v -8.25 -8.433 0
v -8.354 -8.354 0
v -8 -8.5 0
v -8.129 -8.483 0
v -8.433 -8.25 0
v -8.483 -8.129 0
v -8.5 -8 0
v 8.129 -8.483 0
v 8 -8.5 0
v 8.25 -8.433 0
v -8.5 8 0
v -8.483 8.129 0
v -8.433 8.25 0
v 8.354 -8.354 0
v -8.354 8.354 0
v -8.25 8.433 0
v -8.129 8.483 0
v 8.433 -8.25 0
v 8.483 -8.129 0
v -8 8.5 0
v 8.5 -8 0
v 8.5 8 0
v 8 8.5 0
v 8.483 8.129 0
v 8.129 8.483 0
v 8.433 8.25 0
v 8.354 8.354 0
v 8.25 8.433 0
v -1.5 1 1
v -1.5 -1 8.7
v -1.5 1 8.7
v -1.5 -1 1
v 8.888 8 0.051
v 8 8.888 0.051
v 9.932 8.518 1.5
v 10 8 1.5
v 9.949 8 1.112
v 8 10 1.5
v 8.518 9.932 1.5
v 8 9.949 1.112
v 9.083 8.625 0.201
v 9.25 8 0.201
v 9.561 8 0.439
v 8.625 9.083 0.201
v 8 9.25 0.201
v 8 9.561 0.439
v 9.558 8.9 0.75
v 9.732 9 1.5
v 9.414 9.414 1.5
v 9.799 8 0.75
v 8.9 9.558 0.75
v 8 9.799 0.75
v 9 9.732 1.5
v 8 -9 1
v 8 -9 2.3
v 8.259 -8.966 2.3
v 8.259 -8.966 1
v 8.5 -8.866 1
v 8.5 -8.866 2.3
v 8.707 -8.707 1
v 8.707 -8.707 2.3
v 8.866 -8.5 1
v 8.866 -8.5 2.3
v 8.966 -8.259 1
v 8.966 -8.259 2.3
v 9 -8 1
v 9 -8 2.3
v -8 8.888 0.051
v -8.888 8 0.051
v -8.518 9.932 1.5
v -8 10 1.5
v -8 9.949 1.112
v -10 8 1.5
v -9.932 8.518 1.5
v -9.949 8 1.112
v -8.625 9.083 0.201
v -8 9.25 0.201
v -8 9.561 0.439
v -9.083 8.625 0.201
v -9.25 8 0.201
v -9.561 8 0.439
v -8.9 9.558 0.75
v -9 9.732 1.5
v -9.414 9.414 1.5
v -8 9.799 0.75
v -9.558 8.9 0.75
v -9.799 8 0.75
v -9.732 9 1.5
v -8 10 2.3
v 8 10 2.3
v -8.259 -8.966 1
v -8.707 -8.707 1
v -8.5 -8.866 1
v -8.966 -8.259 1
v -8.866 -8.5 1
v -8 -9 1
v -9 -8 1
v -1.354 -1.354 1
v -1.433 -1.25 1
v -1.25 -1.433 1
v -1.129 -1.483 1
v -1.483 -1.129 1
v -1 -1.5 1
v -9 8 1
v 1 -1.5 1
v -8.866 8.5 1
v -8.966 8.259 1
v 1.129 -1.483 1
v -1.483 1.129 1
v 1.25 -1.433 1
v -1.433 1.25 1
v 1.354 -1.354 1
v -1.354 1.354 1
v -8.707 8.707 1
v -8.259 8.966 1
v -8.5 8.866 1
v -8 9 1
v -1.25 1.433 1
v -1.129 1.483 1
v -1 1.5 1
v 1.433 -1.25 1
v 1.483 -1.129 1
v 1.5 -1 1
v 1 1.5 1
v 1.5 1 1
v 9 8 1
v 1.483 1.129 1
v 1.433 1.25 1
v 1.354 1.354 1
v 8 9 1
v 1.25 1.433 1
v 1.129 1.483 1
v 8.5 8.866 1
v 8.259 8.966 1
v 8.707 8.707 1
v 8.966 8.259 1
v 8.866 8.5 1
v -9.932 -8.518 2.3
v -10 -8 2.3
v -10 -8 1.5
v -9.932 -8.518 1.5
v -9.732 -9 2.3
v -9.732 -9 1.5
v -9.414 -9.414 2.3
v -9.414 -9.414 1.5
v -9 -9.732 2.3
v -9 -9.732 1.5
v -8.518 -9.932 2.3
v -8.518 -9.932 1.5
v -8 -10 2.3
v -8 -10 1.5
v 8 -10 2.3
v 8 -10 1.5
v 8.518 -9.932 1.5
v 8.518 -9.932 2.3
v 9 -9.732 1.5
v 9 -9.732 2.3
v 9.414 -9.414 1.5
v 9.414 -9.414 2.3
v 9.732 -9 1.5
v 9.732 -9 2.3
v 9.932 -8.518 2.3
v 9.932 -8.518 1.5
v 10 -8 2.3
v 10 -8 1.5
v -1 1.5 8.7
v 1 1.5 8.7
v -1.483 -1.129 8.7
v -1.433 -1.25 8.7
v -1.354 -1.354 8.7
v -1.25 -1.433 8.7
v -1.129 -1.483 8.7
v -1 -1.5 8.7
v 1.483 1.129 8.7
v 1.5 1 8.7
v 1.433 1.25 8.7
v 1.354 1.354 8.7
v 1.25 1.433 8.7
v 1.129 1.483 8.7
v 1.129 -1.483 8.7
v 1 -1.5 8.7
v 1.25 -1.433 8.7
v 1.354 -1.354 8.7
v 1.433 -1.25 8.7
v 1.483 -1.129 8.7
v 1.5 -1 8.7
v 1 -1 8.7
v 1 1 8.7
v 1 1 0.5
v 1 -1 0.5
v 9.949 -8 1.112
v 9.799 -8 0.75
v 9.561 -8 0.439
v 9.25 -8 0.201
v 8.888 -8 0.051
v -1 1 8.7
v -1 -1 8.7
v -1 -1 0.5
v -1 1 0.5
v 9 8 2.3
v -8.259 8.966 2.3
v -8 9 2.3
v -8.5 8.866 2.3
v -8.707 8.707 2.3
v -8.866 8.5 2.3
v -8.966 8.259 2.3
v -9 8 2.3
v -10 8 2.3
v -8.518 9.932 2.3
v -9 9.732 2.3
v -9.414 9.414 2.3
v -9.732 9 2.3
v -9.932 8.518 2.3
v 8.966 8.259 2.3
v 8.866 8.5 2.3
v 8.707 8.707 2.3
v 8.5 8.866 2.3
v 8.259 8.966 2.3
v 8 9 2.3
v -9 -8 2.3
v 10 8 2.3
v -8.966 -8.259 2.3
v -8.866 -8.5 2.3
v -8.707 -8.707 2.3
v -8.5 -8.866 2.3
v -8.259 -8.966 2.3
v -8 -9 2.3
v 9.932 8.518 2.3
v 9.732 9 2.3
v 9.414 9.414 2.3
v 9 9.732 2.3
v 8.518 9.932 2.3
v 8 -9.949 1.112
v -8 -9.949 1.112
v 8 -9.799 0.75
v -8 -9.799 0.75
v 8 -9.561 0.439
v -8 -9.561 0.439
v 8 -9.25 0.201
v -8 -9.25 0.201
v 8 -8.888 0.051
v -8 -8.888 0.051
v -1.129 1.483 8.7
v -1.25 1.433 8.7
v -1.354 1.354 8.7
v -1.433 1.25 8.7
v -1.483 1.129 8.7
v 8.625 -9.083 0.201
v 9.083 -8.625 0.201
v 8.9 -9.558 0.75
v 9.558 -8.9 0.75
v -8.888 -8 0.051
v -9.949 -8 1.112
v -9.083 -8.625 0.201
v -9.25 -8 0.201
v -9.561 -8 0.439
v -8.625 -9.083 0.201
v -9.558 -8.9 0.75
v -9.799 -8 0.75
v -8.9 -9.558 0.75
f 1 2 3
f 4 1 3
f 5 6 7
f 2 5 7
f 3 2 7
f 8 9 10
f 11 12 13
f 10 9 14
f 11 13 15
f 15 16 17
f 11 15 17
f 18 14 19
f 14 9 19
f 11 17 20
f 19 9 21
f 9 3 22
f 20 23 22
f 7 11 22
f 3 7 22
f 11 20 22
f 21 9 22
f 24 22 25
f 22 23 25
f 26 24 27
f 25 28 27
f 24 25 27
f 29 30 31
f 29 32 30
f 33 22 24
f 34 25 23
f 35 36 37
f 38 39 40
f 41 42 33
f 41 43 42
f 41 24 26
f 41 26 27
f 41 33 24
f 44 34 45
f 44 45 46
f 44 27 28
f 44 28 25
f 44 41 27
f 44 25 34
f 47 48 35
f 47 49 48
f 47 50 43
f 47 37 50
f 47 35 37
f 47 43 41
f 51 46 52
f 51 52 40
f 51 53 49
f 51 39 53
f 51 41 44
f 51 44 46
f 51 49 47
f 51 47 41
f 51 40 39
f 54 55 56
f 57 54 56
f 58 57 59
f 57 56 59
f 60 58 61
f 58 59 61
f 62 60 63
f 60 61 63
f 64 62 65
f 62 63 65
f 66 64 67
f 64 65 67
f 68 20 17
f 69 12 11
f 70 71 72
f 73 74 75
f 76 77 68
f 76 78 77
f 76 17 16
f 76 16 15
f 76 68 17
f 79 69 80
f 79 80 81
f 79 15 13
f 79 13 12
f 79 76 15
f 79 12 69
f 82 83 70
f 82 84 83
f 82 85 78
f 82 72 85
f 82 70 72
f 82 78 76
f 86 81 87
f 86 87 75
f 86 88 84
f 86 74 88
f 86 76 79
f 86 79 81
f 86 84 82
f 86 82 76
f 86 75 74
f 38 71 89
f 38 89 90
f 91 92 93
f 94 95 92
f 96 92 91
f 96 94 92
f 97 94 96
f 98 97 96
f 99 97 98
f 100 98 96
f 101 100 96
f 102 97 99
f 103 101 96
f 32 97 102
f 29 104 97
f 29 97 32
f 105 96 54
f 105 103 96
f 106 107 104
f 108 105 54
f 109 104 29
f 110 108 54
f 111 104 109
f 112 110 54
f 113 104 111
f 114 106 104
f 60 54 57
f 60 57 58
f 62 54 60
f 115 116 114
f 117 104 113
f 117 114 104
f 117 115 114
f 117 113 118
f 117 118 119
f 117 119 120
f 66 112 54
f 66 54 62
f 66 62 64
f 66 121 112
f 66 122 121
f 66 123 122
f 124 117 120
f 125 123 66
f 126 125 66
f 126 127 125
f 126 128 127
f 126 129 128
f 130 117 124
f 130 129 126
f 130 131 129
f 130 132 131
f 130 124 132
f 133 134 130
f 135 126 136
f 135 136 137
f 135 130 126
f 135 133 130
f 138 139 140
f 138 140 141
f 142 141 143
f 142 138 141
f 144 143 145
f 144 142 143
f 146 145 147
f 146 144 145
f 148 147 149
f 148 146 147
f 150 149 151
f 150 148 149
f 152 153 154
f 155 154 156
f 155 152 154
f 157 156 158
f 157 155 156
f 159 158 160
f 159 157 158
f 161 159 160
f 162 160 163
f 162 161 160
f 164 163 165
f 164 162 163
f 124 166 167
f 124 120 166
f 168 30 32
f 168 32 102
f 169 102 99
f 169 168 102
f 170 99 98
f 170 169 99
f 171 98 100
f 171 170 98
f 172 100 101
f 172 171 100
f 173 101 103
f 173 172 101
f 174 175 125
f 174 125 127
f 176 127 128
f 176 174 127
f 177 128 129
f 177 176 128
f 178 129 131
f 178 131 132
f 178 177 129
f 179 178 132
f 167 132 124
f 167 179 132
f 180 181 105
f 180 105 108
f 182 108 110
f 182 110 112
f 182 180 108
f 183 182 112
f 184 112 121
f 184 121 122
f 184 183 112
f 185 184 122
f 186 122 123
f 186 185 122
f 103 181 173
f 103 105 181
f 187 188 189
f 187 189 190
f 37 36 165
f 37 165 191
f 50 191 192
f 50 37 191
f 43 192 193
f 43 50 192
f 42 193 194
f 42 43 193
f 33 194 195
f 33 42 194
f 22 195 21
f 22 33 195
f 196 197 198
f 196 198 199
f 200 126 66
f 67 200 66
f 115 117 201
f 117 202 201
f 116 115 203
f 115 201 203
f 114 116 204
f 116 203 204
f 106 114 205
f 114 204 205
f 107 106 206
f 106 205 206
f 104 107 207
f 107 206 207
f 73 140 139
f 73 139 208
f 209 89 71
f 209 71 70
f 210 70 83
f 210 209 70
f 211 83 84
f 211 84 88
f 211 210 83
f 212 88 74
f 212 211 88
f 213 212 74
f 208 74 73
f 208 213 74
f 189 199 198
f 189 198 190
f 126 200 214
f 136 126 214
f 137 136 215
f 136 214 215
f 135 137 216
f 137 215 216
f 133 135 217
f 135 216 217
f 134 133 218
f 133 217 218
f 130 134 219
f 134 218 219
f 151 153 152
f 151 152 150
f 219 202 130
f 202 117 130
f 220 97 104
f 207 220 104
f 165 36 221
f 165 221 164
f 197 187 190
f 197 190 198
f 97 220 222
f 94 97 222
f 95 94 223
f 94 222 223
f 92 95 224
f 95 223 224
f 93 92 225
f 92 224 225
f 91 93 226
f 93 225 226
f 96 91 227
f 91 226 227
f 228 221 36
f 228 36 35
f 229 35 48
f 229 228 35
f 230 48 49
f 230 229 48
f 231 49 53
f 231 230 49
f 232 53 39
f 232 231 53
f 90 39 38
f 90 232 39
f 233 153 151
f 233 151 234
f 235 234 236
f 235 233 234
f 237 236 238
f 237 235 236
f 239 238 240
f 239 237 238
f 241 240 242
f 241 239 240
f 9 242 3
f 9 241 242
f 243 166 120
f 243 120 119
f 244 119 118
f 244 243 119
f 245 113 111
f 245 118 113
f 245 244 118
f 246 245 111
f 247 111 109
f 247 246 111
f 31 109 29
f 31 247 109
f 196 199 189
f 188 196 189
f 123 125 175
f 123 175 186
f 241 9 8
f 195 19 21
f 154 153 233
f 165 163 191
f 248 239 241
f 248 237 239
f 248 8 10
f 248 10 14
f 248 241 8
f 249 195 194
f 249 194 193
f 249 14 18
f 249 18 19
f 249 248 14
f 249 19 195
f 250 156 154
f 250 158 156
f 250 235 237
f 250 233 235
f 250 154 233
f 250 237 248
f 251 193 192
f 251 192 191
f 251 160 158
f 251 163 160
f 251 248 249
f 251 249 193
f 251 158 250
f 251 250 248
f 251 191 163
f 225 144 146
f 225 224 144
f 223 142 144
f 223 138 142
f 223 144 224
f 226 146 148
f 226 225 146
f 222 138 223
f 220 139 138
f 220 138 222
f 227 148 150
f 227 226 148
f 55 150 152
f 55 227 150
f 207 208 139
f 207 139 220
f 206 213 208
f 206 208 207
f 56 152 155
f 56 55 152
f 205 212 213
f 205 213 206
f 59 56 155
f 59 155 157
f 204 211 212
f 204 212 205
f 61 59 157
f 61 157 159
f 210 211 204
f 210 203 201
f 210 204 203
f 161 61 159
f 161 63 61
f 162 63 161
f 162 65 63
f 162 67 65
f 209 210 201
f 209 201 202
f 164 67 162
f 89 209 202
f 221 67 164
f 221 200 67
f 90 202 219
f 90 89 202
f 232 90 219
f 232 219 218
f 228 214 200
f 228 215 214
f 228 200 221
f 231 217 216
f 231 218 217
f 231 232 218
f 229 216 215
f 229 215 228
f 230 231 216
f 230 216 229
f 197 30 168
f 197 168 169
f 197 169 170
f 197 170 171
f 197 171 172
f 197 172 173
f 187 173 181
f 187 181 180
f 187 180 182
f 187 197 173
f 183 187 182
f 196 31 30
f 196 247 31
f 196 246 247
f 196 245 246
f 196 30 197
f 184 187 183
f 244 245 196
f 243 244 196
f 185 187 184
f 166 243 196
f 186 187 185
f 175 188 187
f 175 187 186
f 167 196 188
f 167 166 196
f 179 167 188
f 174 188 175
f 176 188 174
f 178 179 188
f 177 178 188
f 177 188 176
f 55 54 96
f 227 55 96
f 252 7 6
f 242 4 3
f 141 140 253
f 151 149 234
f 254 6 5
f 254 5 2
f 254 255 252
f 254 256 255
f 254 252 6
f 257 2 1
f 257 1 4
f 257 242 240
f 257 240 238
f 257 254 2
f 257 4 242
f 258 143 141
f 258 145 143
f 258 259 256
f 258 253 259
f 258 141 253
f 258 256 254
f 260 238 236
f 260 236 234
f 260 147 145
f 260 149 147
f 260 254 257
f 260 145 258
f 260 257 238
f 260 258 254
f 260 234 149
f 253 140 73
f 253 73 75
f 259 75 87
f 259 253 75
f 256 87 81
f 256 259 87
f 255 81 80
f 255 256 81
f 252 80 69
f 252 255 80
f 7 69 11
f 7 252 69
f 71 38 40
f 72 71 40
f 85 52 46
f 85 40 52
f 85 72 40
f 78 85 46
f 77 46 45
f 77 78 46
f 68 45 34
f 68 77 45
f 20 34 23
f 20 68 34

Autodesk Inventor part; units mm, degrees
ref_plane "YZ Plane" through (0, 0, 0) normal (1, 0, 0) x (0, 1, 0)
ref_plane "XZ Plane" through (0, 0, 0) normal (0, 1, 0) x (-1, 0, 0)
ref_plane "XY Plane" through (0, 0, 0) normal (0, 0, 1) x (1, 0, 0)
sketch "Skizze1" plane through (0, 0, 0) normal (0, 0, 1) x (1, 0, 0)
  line L0 (-10, 10) -> (10, 10)
  line L1 (10, 10) -> (10, -10)
  line L2 (10, -10) -> (-10, -10)
  line L3 (-10, -10) -> (-10, 10)
  line L4 (-10, 10) -> (10, -10) construction
  line L5 (10, 10) -> (-10, -10) construction
  point P0 (0, 0)
  dimension "d0" = 20
  dimension "d1" = 20
extrude "Extrusion1" add sketch "Skizze1" along normal blind 2.3
fillet "Rundung1" radius 2 4 edges at (10, 10, 1.15) (-10, 10, 1.15) (10, -10, 1.15) (-10, -10, 1.15)
shell "Wandung1" thickness 1 removed faces 1 at (-2.6667, -2, 2.3)
fillet "Rundung2" radius 1.5 8 edges at (-9.4142, 9.4142, 0) (-10, 0, 0) (-9.4142, -9.4142, 0) (0, -10, 0) (9.4142, -9.4142, 0) (10, 0, 0) (9.4142, 9.4142, 0) (0, 10, 0)
sketch "Skizze2" plane through (-9, 9, 1) normal (0, 0, 1) x (1, 0, 0)
  line L0 (7.5, -7.5) -> (10.5, -7.5)
  line L1 (10.5, -7.5) -> (10.5, -10.5)
  line L2 (10.5, -10.5) -> (7.5, -10.5)
  line L3 (7.5, -10.5) -> (7.5, -7.5)
  line L4 (7.5, -7.5) -> (10.5, -10.5) construction
  line L5 (10.5, -7.5) -> (7.5, -10.5) construction
  point P0 (9, -9)
  dimension "d7" = 3
  dimension "d8" = 3
extrude "Extrusion2" add sketch "Skizze2" along normal blind 7.7
fillet "Rundung3" radius 0.5 4 edges at (1.5, 1.5, 4.85) (-1.5, 1.5, 4.85) (1.5, -1.5, 4.85) (-1.5, -1.5, 4.85)
shell "Wandung2" thickness 0.5 removed faces 1 at (0.3333, -0.5, 8.7)
properties part number "Abdeckkappe 5 20x20"
